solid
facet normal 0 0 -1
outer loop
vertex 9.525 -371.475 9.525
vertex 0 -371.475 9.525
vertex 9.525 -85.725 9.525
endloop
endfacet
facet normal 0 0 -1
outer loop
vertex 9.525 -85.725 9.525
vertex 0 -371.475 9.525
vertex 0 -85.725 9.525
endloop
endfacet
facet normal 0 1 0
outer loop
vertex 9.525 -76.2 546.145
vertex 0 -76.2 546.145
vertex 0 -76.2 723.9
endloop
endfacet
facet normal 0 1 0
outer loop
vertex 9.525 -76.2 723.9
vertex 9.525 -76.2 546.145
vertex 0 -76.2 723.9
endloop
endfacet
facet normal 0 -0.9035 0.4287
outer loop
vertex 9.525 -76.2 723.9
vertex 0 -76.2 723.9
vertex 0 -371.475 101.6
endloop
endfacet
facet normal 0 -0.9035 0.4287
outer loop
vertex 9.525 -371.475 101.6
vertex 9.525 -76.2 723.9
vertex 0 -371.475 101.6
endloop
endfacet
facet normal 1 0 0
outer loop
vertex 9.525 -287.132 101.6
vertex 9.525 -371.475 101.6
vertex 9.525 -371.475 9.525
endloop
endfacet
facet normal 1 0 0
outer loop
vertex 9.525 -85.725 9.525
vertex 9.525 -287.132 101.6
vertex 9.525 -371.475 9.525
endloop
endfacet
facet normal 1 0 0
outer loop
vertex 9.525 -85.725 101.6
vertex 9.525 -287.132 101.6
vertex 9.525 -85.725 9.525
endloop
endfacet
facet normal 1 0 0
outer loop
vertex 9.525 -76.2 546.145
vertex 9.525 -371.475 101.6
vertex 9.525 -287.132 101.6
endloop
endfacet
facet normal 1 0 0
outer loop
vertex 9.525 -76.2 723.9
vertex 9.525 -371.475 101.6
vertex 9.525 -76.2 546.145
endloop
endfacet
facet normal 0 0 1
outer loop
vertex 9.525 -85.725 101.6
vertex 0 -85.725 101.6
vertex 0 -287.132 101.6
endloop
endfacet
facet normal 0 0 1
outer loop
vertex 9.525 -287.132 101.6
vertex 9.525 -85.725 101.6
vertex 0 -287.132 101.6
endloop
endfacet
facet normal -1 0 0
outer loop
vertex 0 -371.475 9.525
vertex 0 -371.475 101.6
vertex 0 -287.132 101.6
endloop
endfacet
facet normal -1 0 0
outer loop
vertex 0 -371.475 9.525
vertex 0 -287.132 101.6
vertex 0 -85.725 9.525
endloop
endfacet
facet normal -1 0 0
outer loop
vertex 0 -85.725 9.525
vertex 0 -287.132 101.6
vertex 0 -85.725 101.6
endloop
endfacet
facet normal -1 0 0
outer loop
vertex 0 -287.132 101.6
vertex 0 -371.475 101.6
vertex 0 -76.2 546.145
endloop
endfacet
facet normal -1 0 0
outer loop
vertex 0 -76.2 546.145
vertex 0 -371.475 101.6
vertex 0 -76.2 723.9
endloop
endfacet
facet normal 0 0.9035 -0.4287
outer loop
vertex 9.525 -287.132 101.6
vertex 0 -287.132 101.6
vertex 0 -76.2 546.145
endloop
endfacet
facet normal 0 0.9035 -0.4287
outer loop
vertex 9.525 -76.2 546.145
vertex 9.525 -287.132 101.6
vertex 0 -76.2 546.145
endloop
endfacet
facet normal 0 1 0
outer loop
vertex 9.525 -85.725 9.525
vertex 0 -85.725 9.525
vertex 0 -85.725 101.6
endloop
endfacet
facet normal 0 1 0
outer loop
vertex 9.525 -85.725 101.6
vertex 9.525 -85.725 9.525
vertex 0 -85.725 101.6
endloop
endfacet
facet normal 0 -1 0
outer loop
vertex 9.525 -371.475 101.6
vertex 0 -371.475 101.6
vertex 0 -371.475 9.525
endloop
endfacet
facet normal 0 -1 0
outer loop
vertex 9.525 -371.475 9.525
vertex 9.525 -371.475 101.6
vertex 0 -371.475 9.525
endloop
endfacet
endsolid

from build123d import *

# Parameters (mm, degrees)
F1_DEPTH = 9.525


with BuildPart() as f1:
    # F0 (on Right) → F1 (new body)
    with BuildSketch(Plane.YZ):
        Polygon((-76.2, 546.145316), (-76.2, 723.9), (-371.475, 101.6), (-287.132216, 101.6), align=None)
        Polygon((-177.8, 9.525), (-85.725, 9.525), (-85.725, 101.6), (-287.132216, 101.6), (-371.475, 101.6), (-371.475, 9.525), (-279.4, 9.525), align=None)
    extrude(amount=F1_DEPTH)


solid = f1.part
